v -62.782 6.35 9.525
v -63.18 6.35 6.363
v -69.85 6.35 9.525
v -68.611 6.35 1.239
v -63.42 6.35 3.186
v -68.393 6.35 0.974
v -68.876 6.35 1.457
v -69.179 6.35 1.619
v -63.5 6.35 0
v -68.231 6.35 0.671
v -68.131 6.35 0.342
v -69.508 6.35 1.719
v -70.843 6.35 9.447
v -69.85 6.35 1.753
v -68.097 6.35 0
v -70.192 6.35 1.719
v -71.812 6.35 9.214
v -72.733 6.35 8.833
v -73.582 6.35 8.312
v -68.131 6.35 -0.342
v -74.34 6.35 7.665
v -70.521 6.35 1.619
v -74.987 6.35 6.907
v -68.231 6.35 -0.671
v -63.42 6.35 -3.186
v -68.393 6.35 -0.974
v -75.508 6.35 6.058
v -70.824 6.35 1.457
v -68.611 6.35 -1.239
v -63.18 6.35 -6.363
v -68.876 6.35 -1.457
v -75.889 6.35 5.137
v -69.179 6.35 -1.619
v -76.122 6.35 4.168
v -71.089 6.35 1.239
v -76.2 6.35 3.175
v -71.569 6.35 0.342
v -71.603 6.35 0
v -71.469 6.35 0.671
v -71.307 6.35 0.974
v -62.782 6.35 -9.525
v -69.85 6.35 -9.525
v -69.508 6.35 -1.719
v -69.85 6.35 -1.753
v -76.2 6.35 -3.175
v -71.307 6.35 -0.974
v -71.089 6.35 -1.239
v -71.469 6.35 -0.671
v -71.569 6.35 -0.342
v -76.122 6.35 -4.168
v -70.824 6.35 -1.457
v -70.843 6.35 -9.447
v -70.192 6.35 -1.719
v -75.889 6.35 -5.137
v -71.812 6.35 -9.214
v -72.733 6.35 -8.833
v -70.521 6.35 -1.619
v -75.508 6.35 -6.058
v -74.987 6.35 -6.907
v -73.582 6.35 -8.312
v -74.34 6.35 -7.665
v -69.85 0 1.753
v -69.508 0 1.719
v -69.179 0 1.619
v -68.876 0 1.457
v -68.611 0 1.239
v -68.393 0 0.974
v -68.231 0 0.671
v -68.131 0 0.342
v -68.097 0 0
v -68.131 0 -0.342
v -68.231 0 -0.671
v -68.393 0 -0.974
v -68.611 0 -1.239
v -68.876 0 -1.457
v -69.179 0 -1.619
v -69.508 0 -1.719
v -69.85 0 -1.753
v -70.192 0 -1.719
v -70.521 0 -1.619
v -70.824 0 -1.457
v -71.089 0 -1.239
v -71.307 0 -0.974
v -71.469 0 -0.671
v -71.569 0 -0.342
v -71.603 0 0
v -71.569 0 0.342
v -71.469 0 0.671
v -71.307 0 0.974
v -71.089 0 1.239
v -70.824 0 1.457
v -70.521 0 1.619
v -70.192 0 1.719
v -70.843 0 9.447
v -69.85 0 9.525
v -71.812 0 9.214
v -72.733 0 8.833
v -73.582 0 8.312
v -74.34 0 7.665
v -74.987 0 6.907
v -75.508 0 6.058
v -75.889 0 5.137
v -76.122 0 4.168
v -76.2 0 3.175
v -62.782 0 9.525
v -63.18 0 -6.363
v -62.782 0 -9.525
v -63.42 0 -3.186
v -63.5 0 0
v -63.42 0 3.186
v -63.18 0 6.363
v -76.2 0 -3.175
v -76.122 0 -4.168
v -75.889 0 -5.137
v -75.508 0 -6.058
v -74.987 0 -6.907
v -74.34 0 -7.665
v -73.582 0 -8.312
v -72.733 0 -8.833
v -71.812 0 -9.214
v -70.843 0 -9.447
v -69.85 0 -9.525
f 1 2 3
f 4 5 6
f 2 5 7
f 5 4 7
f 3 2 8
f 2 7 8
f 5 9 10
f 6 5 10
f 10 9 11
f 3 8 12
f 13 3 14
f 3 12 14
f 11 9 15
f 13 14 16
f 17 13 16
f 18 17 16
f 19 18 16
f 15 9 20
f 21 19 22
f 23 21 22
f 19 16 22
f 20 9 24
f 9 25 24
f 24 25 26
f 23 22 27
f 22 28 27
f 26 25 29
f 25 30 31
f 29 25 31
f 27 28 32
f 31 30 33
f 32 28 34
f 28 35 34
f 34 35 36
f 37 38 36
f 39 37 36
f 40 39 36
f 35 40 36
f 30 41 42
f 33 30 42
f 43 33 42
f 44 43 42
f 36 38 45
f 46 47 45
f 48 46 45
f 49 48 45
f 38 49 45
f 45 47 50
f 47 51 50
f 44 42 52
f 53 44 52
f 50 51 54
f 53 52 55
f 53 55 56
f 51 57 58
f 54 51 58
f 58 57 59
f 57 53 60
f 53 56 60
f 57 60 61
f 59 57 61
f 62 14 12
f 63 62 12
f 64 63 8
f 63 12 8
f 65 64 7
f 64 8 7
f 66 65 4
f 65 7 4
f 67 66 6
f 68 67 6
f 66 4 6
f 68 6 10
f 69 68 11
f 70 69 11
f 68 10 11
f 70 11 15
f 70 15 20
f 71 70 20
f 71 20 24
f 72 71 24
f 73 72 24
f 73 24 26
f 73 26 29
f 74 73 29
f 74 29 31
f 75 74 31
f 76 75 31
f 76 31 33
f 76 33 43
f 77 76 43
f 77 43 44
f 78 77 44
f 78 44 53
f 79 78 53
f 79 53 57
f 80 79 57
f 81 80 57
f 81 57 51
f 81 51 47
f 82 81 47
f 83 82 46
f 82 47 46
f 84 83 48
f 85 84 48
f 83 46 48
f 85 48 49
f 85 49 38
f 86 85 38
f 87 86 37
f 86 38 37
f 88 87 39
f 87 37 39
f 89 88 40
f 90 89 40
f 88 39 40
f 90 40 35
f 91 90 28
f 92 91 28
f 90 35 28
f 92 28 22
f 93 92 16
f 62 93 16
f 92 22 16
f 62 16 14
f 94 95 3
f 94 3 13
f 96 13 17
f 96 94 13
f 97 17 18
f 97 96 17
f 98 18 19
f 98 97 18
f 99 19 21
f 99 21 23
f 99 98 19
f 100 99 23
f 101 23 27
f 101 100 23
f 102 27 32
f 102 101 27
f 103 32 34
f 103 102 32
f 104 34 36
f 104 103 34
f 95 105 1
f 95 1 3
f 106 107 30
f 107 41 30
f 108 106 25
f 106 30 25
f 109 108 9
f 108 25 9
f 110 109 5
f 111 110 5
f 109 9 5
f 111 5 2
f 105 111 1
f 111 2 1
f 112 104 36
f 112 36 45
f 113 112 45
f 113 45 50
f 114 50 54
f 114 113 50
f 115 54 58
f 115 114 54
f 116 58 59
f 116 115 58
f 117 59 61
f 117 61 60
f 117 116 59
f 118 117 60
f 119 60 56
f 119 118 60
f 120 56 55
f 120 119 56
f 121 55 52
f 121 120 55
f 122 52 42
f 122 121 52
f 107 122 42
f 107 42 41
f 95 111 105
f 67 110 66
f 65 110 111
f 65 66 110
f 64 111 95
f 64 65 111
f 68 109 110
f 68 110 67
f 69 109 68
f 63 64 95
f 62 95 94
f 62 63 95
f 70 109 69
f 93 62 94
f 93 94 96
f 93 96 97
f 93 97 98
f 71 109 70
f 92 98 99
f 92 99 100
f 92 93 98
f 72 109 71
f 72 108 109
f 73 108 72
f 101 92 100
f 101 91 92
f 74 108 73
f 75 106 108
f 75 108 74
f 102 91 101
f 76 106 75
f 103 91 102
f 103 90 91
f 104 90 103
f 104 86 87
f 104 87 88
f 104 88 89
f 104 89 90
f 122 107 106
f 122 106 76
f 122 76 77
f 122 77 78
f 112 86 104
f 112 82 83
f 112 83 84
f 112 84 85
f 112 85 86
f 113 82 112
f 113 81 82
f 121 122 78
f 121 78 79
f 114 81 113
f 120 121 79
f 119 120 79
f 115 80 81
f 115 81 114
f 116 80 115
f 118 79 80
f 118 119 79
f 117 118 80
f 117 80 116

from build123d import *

# Parameters (mm, degrees)
EXTRUDE1_DEPTH                  = 6.35
SKETCH2_R                       = 63.5
CUT_EXTRUDE1_DEPTH              = 6.35
F_6_32_TAPPED_HOLE1_D           = 2.7051
F_6_32_TAPPED_HOLE1_DEPTH       = 9.398
F_6_32_TAPPED_HOLE1_CBORE_D     = 3.5052
F_6_32_TAPPED_HOLE1_CBORE_DEPTH = 7.112
F_6_32_TAPPED_HOLE1_TIP         = 0.81269403


with BuildPart() as part:
    # Sketch1 → Extrude1 (new body)
    with BuildSketch(Plane(origin=(0, 0, 0), x_dir=(1, 0, 0), z_dir=(0, 1, 0))):
        with BuildLine():
            Line((-69.85, 9.525), (0, 9.525))
            Line((0, 9.525), (0, -9.525))
            Line((0, -9.525), (-69.85, -9.525))
            ThreePointArc((-69.85, -9.525), (-74.340128061, -7.665128061), (-76.2, -3.175))
            Line((-76.2, -3.175), (-76.2, 3.175))
            ThreePointArc((-76.2, 3.175), (-74.340128061, 7.665128061), (-69.85, 9.525))
        make_face()
    extrude(amount=EXTRUDE1_DEPTH)

    # Sketch2 → Cut-Extrude1 (cut)
    with BuildSketch(Plane(origin=(0, 6.35, 0), x_dir=(-1, 0, 0), z_dir=(0, 1, 0))):
        Circle(SKETCH2_R)
    extrude(amount=-CUT_EXTRUDE1_DEPTH, mode=Mode.SUBTRACT)

    # #6-32 Tapped Hole1
    with Locations(Plane(origin=(-69.85, 6.35, 0), x_dir=(0, 0, 1), z_dir=(0, 1, 0))):
        with Locations((0, 0)):
            CounterBoreHole(F_6_32_TAPPED_HOLE1_D / 2, F_6_32_TAPPED_HOLE1_CBORE_D / 2, F_6_32_TAPPED_HOLE1_CBORE_DEPTH, depth=F_6_32_TAPPED_HOLE1_DEPTH)
            with Locations((0, 0, -(F_6_32_TAPPED_HOLE1_DEPTH + F_6_32_TAPPED_HOLE1_TIP / 2))):  # 118° drill point
                Cone(0, F_6_32_TAPPED_HOLE1_D / 2, F_6_32_TAPPED_HOLE1_TIP, mode=Mode.SUBTRACT)


solid = part.part
